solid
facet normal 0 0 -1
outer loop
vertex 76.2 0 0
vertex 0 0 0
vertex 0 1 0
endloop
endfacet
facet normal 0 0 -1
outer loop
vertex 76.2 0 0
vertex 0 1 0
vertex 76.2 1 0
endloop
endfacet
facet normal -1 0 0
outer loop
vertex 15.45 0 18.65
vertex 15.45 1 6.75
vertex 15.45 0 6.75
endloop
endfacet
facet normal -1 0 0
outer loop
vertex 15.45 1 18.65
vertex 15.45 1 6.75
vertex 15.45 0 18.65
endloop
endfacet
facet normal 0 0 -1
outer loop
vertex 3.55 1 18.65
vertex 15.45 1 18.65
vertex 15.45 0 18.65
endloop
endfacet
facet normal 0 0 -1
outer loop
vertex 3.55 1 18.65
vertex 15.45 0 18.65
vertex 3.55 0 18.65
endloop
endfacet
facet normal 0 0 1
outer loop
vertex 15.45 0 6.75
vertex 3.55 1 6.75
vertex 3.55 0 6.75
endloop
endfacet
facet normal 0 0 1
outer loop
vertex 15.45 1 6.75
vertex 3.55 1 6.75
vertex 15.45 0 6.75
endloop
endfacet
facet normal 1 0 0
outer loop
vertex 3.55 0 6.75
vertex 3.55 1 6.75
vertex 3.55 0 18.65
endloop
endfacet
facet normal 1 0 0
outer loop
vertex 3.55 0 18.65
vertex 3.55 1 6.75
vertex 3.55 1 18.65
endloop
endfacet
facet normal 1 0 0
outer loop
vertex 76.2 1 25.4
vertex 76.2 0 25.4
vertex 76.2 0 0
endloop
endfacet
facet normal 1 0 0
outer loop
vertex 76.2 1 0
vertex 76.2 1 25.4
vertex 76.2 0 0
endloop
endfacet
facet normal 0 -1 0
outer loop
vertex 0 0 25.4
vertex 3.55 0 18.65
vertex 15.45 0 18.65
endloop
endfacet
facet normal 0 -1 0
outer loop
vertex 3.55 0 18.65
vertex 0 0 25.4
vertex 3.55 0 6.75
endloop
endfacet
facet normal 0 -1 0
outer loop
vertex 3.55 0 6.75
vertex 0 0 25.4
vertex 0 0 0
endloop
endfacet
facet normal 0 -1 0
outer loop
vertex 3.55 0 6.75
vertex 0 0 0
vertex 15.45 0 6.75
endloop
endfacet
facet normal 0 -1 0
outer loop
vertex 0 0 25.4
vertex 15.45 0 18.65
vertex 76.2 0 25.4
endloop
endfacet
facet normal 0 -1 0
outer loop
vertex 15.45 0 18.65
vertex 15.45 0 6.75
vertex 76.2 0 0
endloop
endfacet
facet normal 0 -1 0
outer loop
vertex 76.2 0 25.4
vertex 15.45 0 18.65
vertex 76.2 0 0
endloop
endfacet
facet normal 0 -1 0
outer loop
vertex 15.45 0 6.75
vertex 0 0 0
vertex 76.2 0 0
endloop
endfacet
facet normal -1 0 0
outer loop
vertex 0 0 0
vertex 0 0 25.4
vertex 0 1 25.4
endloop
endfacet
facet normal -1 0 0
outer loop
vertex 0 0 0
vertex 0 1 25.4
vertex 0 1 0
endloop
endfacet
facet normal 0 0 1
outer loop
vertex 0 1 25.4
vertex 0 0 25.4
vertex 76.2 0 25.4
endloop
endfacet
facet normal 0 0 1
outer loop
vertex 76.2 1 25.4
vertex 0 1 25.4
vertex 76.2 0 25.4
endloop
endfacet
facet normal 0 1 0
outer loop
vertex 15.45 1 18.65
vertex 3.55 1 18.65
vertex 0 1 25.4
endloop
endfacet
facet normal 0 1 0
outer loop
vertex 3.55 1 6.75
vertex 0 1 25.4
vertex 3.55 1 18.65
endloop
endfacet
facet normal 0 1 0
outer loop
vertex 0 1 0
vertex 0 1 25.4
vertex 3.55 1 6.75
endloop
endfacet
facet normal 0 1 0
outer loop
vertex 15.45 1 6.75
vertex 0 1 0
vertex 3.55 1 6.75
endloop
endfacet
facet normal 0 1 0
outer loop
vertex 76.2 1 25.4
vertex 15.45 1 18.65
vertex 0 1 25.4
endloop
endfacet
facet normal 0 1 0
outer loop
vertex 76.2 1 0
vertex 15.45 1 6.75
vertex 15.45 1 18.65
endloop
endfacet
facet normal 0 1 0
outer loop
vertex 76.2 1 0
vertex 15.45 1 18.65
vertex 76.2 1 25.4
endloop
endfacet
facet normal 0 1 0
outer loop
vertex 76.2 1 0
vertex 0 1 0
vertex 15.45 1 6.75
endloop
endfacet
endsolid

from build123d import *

# Parameters (mm, degrees)
SKETCH_1_W          = 76.2
SKETCH_1_H          = 25.4
EXTRUDE_1_DEPTH     = 1
CUT_EXTRUDE_1_DEPTH = 1


with BuildPart() as part:
    # 草图1 → 凸台-拉伸1 (new body)
    with BuildSketch(Plane(origin=(0, 0, 0), x_dir=(1, 0, 0), z_dir=(0, 1, 0))):
        with Locations((38.1, -12.7)):
            Rectangle(SKETCH_1_W, SKETCH_1_H)
    extrude(amount=EXTRUDE_1_DEPTH)

    # 草图2 → 切除-拉伸1 (cut)
    with BuildSketch(Plane(origin=(0, 1, 0), x_dir=(1, 0, 0), z_dir=(0, 1, 0))):
        Polygon((3.55, -12.7), (3.55, -6.75), (15.45, -6.75), (15.45, -18.65), (3.55, -18.65), align=None)
    extrude(amount=-CUT_EXTRUDE_1_DEPTH, mode=Mode.SUBTRACT)


solid = part.part
